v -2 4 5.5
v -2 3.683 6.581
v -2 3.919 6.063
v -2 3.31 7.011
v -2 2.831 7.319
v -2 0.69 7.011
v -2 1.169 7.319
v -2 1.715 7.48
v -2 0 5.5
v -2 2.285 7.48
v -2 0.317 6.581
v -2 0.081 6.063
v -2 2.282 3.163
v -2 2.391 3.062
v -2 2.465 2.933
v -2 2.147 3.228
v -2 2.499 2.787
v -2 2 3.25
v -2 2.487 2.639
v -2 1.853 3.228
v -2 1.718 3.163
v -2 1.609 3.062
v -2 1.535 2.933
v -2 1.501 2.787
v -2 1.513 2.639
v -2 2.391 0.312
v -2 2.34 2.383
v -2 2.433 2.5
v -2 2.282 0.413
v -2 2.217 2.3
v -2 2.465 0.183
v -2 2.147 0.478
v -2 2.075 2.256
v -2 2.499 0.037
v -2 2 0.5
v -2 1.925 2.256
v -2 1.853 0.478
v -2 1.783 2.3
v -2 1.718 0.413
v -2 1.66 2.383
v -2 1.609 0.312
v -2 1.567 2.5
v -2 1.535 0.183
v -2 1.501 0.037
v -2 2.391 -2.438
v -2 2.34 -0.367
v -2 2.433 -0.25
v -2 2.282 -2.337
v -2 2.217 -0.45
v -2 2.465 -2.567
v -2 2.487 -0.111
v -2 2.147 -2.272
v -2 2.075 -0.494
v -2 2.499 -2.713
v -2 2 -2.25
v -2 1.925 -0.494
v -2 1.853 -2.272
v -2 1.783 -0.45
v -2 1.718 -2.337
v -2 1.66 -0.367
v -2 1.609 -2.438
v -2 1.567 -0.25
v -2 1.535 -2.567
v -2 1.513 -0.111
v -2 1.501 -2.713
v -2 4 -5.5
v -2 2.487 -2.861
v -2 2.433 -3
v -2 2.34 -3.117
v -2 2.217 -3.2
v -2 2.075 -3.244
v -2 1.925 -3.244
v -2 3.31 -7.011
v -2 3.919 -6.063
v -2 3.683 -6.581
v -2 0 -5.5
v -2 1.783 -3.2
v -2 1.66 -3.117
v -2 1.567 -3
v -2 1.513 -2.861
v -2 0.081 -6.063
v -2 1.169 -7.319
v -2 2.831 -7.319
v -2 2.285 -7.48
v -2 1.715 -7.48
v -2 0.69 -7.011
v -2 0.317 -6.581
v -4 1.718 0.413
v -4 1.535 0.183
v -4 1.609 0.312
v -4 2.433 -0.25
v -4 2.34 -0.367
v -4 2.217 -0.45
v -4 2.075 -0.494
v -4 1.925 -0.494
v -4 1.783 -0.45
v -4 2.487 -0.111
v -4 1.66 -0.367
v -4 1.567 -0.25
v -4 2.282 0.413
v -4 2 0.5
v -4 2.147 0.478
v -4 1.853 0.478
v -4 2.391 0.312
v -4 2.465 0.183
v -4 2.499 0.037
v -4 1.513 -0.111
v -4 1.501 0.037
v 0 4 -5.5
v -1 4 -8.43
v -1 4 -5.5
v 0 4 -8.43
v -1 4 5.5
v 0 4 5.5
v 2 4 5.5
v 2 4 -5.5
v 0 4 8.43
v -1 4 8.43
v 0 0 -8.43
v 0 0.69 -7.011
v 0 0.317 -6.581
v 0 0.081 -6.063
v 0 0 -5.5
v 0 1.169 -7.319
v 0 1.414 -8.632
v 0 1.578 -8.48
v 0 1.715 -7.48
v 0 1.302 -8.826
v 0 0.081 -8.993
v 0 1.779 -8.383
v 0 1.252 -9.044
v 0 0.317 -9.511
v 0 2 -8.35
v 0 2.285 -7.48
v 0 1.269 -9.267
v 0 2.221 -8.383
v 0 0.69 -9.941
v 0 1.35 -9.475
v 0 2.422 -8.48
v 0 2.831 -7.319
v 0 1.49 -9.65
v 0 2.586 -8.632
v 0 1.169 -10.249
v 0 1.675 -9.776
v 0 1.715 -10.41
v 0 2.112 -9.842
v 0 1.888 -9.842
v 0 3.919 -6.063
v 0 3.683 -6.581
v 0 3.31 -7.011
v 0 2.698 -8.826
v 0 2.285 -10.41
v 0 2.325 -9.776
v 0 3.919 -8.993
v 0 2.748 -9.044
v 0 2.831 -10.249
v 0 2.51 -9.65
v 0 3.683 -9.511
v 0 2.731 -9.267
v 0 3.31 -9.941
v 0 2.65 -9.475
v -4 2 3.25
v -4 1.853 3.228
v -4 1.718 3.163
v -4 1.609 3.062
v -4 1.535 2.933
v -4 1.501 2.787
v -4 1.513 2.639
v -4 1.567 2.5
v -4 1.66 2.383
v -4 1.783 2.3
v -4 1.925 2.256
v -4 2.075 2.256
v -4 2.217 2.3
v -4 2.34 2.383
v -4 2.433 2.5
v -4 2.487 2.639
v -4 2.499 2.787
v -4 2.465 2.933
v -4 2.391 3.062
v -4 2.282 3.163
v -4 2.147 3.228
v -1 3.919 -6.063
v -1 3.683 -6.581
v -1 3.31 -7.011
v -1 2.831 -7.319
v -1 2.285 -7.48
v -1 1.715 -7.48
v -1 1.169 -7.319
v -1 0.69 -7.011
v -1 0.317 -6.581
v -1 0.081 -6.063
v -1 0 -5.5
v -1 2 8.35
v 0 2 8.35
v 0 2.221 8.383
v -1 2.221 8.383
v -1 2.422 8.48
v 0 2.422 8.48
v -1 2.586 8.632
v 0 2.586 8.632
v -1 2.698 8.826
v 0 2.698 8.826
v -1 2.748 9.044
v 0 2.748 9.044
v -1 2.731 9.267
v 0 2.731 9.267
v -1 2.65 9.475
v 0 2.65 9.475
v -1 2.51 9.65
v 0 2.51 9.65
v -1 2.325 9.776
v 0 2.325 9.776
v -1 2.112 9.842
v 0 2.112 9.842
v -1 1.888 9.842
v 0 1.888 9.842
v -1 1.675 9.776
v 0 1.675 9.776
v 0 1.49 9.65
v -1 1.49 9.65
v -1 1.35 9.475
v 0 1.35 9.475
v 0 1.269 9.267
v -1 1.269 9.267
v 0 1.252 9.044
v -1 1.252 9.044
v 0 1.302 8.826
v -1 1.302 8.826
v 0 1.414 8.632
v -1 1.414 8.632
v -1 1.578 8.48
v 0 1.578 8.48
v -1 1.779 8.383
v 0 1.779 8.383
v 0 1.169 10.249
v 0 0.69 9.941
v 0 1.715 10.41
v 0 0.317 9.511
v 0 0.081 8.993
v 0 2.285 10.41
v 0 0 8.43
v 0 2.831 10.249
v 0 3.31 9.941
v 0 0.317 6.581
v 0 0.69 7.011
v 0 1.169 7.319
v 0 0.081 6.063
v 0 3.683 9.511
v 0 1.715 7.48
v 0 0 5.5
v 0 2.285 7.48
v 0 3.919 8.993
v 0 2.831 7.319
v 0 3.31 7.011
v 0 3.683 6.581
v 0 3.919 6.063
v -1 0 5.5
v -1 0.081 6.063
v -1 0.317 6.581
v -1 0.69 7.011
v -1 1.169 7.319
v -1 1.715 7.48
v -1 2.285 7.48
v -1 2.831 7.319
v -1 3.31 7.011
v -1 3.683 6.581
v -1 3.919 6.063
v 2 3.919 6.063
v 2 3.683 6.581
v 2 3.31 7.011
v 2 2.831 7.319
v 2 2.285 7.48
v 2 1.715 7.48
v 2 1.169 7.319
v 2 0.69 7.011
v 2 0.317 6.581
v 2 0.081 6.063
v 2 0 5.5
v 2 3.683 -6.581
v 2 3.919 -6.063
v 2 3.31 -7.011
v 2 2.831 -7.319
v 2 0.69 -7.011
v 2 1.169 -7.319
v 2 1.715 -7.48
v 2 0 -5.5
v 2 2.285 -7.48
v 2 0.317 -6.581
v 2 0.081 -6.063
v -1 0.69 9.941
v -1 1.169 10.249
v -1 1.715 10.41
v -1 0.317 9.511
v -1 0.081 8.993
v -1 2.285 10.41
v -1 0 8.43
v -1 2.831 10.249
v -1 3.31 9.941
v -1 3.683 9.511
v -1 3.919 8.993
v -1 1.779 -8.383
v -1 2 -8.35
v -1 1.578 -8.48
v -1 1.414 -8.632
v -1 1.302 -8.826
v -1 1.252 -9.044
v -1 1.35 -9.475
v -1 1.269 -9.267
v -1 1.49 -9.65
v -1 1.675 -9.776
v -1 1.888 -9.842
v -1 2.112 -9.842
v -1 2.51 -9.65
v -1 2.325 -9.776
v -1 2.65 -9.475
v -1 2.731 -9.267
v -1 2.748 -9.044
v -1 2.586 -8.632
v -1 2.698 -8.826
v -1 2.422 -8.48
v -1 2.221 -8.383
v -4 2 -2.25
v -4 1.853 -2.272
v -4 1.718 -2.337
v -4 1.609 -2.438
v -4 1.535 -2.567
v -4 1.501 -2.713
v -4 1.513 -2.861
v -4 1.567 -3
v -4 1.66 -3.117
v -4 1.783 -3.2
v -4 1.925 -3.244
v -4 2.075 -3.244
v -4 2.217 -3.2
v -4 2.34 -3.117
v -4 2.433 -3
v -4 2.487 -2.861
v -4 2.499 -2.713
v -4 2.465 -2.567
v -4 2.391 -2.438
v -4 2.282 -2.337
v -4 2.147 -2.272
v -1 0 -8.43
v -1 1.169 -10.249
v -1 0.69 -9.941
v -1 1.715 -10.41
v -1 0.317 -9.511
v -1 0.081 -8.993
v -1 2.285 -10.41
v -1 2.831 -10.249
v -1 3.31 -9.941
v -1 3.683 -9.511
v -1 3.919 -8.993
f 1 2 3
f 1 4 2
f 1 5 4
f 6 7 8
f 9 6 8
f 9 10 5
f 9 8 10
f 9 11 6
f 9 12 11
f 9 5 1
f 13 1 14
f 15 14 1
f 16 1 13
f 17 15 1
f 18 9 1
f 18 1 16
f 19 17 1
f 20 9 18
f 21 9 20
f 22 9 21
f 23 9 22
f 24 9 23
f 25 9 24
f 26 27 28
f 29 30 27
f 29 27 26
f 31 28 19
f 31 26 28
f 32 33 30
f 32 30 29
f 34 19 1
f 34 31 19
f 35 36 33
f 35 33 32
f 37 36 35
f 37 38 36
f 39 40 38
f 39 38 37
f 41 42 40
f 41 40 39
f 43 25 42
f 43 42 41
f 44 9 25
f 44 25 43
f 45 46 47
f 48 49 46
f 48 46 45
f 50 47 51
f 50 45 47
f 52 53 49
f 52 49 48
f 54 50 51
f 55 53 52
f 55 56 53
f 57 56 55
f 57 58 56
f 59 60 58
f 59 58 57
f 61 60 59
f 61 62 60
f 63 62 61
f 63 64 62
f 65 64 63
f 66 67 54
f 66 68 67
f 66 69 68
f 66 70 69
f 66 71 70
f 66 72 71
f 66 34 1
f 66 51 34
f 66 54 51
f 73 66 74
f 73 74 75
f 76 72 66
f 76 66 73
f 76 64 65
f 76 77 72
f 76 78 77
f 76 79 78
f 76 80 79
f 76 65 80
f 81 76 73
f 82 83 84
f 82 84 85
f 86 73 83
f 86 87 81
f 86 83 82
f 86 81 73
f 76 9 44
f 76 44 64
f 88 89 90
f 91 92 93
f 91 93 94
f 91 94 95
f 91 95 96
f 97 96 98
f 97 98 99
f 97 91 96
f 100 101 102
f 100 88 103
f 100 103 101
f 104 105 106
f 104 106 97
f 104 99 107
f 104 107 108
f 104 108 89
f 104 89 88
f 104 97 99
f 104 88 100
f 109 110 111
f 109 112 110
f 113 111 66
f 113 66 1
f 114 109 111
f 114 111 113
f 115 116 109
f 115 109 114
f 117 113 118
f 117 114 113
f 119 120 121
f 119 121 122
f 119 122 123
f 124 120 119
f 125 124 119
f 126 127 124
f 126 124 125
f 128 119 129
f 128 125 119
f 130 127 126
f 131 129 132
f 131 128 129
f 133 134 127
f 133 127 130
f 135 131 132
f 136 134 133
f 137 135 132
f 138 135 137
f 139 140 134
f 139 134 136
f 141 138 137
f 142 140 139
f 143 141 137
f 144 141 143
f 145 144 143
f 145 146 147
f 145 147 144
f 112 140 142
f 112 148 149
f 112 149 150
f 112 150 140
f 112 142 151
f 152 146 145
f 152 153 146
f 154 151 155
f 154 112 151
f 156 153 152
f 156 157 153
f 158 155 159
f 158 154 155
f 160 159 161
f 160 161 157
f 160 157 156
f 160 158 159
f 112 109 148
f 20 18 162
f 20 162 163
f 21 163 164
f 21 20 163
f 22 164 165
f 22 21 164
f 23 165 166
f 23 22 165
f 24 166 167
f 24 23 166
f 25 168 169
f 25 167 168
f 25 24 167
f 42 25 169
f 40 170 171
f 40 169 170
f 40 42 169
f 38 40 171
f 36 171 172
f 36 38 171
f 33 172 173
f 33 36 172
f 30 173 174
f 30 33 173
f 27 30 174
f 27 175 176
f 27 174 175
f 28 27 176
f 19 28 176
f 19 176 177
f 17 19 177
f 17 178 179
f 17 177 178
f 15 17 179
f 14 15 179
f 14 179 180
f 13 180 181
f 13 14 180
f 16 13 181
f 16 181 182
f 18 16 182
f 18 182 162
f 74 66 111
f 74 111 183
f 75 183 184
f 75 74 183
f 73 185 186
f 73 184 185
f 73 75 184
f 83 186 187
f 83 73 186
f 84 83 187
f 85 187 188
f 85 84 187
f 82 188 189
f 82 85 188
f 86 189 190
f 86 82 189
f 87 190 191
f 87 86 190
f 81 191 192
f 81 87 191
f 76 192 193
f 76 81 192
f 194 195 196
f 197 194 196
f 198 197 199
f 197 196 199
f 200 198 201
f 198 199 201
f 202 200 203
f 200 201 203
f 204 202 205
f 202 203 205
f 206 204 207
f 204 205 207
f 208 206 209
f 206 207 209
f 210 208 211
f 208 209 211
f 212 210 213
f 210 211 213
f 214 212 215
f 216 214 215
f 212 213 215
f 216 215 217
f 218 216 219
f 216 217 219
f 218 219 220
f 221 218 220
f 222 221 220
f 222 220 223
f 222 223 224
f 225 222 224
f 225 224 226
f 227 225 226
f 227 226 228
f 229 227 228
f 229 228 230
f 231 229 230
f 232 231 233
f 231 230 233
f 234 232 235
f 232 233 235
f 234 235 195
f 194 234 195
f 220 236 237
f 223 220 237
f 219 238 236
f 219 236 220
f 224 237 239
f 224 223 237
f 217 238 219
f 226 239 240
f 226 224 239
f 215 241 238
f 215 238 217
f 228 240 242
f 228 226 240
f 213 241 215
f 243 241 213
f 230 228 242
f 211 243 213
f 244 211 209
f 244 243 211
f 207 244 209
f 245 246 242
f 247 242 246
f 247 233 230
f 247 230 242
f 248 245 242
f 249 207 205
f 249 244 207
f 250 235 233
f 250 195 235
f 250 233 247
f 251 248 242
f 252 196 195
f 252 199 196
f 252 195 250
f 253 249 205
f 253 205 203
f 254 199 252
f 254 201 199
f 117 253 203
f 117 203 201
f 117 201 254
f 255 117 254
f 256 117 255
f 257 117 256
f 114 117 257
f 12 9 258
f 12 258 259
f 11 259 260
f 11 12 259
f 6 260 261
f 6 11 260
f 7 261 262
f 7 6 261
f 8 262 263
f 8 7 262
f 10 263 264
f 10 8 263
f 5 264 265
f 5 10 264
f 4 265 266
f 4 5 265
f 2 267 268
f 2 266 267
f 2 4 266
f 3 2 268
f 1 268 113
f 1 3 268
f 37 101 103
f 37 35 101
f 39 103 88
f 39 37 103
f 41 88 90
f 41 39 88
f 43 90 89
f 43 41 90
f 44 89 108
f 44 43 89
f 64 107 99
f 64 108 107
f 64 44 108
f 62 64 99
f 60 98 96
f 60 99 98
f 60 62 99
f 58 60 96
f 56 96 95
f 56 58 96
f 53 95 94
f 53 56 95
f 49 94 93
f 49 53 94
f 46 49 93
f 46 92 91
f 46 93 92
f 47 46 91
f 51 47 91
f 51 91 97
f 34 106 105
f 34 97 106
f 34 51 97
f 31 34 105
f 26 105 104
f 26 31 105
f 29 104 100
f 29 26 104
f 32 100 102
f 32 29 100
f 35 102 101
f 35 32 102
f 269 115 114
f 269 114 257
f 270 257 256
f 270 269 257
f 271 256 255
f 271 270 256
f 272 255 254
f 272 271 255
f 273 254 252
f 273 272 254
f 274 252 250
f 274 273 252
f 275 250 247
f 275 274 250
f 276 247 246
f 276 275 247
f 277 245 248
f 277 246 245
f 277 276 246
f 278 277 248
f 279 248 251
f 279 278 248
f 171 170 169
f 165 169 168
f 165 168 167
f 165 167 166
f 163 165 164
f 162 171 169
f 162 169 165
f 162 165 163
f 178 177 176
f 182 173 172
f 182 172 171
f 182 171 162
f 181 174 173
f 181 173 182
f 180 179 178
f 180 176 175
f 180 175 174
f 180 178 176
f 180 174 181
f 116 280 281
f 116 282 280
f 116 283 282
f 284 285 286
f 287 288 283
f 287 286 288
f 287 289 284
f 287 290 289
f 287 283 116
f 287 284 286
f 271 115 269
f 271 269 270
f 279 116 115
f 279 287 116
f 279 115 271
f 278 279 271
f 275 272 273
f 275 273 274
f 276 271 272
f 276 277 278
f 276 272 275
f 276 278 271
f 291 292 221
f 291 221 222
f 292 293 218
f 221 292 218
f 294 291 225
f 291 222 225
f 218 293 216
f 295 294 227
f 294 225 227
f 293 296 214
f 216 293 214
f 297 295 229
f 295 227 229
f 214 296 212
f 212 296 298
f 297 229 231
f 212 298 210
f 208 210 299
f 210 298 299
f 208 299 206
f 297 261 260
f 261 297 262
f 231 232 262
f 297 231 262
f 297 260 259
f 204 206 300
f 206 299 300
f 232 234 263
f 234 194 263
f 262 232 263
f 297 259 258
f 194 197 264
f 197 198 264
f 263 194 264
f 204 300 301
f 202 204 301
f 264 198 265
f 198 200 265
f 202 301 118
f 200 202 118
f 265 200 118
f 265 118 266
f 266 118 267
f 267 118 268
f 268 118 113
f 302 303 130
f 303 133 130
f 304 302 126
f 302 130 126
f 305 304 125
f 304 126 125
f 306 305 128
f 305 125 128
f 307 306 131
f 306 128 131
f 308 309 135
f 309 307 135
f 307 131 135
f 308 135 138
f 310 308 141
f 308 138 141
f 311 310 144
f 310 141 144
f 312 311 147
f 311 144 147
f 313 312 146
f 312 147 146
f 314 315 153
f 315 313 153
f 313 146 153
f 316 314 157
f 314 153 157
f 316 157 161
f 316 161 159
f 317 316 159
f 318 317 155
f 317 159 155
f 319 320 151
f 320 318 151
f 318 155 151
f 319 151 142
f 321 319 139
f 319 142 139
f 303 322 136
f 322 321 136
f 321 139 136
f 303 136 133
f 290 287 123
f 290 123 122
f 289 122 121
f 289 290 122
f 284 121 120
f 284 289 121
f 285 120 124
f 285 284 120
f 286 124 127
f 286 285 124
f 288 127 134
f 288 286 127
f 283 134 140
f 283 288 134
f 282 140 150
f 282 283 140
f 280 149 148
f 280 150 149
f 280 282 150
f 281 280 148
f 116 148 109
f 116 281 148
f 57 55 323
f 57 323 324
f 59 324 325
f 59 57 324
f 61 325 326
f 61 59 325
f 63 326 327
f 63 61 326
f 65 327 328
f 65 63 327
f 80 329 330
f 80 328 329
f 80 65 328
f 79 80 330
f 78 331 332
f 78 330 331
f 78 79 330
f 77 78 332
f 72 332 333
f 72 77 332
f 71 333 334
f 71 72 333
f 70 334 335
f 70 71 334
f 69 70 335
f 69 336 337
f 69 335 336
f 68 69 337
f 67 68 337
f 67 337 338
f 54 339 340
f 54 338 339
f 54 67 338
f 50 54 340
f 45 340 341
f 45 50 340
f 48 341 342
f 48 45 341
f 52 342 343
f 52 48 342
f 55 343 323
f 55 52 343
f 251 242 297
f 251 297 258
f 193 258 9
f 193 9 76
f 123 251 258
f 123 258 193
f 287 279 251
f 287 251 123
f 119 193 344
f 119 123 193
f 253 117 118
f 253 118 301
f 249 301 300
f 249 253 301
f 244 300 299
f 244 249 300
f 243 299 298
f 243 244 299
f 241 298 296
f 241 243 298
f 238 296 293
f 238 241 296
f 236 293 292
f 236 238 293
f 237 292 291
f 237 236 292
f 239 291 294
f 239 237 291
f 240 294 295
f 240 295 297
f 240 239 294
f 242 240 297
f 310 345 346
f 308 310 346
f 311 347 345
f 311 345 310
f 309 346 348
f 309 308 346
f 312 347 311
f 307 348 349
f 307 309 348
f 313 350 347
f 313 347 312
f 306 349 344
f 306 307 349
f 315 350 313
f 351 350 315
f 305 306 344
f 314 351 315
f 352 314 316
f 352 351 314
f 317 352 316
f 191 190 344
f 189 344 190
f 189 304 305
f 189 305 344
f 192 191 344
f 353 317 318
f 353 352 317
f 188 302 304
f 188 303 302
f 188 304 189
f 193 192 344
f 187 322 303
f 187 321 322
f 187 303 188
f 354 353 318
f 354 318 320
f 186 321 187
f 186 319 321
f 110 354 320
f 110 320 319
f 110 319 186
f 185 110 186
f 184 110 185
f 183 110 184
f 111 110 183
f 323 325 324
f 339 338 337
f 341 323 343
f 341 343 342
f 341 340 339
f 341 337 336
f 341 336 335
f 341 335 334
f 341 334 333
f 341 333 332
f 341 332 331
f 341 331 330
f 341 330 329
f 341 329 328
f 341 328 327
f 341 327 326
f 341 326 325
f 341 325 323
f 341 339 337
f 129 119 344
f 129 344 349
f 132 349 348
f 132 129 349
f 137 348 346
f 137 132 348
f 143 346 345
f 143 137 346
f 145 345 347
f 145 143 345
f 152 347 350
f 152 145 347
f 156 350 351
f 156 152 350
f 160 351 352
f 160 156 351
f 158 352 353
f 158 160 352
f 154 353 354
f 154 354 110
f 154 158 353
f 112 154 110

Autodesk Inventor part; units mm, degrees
ref_plane "YZ Plane" through (0, 0, 0) normal (1, 0, 0) x (0, 1, 0)
ref_plane "XZ Plane" through (0, 0, 0) normal (0, 1, 0) x (-1, 0, 0)
ref_plane "XY Plane" through (0, 0, 0) normal (0, 0, 1) x (1, 0, 0)
sketch "Sketch1" plane through (0, 0, 0) normal (0, 1, 0) x (-1, 0, 0)
  line L0 (-2, 7.5) -> (2, 7.5)
  line L1 (2, 7.5) -> (2, -7.5)
  line L2 (2, -7.5) -> (-2, -7.5)
  line L3 (-2, -7.5) -> (-2, 7.5)
  line L4 (-2, 7.5) -> (2, -7.5) construction
  line L5 (2, 7.5) -> (-2, -7.5) construction
  point P0 (0, 0)
  dimension "d0" = 4
  dimension "d1" = 15
extrude "Extrusion1" add sketch "Sketch1" along normal blind 4
sketch "Sketch2" plane through (2, 0, 7.5) normal (1, 0, 0) x (0, 0, -1)
  line L0 (0, 0) -> (0, 4) projected
  line L1 (0, 2) -> (15, 2) construction
  line L2 (15, 0) -> (15, 4) projected
  line L3 (2, 0) -> (13, 0)
  line L4 (13, 4) -> (2, 4)
  arc A0 (2, 4) -> (2, 0) centre (2, 2) ccw
  arc A1 (13, 0) -> (13, 4) centre (13, 2) ccw
  line L5 (0, 4) -> (15, 4) projected
  line L6 (0, 0) -> (15, 0) projected
  point P0 (7.5, 0)
  point P1 (7.5, 2)
  point P2 (15, 2)
extrude "Extrusion2" cut sketch "Sketch2" against normal blind 2 contours L0 A0 L6 | L0 L5 A0 | A1 L2 L6 | L5 L2 A1
sketch "Sketch3" plane through (-2, 0, -7.5) normal (-1, 0, 0) x (0, 0, 1)
  arc A0 (2, 4) -> (0, 2) centre (2, 2) ccw projected
  line L0 (0, 0) -> (0, 4) projected
  line L1 (0, 4) -> (15, 4) projected
  arc A1 (0, 2) -> (2, 0) centre (2, 2) ccw projected
  arc A2 (2, 4) -> (2, 0) centre (2, 2) ccw projected
  line L2 (13, 4) -> (2, 4) projected
  arc A3 (13, 0) -> (13, 4) centre (13, 2) ccw projected
  line L3 (13, 0) -> (2, 0) projected
  line L4 (15, 0) -> (15, 4) projected
  line L5 (0, 0) -> (15, 0) projected
  point P0 (7.5, 0)
  point P1 (15, 2)
extrude "Extrusion3" cut sketch "Sketch3" against normal blind 1 contours A0 L0 L1 | A1 L5 L0 | L1 L4 A3 | L4 L5 A3
sketch "Sketch4" plane through (-2, 0, -5.5) normal (-1, 0, 0) x (0, 0, 1)
  arc A0 (0, 4) -> (-2, 2) centre (0, 2) ccw projected
  circle A1 centre (0, 2) radius 1.5
  arc A2 (13, 2) -> (11, 4) centre (11, 2) ccw projected
  circle A3 centre (11, 2) radius 1.5
  point P0 (5.5, 0)
  dimension "d8" = 3
  dimension "d9" = 3
mark "Mark1"
sketch "Sketch5" plane through (-2, 0, -5.5) normal (-1, 0, 0) x (0, 0, 1)
  circle A0 centre (2.75, 2) radius 1
  circle A1 centre (0, 2) radius 1.5 projected
  circle A2 centre (11, 2) radius 1.5 projected
  line L0 (0, 4) -> (11, 4) projected
  circle A3 centre (5.5, 2) radius 1
  circle A4 centre (8.25, 2) radius 1
  point P0 (5.5, 0)
  dimension "d10" = 2
  dimension "d11" = 2.75
  dimension "d12" = 11
  dimension "d15" = 2.75
mark "Mark2"
sketch "Sketch6" plane through (-2, 2, -2.75) normal (-1, 0, 0) x (0, 0, 1)
  circle A0 centre (0, 0) radius 1 projected
  circle A1 centre (0, 0) radius 0.5
  circle A2 centre (2.75, 0) radius 1 projected
  circle A3 centre (2.75, 0) radius 0.5
  circle A4 centre (5.5, 0) radius 1 projected
  circle A5 centre (5.5, 0) radius 0.5
  point P0 (2.75, -2)
  dimension "d20" = 1
  dimension "d21" = 1
  dimension "d38" = 1
extrude "Extrusion4" add sketch "Sketch6" along normal blind 2 contours A1 | A3 | A5
sketch "Sketch7" plane through (2, 0, 5.5) normal (1, 0, 0) x (0, 0, -1)
  circle A0 centre (0, 2) radius 1.5 projected
  circle A1 centre (11, 2) radius 1.5 projected
  point P0 (5.5, 0)
mark "Mark3"
sketch "Sketch8" plane through (2, 0, 5.5) normal (1, 0, 0) x (0, 0, -1)
  circle A0 centre (8.25, 2) radius 1 projected
  circle A1 centre (5.5, 2) radius 1 projected
  circle A2 centre (5.5, 2) radius 0.75
  circle A3 centre (8.25, 2) radius 0.75
  circle A4 centre (2.75, 2) radius 1 projected
  circle A5 centre (2.75, 2) radius 0.75
  point P0 (5.5, 0)
  dimension "d24" = 1.5
  dimension "d25" = 1.5
  dimension "d39" = 1.5
mark "Mark4"
sketch "Sketch11" plane through (0, 0, 7.5) normal (1, 0, 0) x (0, 0, -1)
  line L0 (-2.93, 2) -> (17.93, 2) construction
  line L1 (-0.93, 0) -> (15.93, 0)
  line L2 (15.93, 4) -> (-0.93, 4)
  arc A0 (-0.93, 4) -> (-0.93, 0) centre (-0.93, 2) ccw
  arc A1 (15.93, 0) -> (15.93, 4) centre (15.93, 2) ccw
  line L3 (2, 0) -> (13, 0) projected
  point P0 (7.5, 0)
  point P1 (7.5, 2)
  point P2 (7.5, 4)
  point P3 (7.5, 0)
  dimension "d31" = 20.86
extrude "Extrusion7" add sketch "Sketch11" against normal blind 1
sketch "Sketch12" plane through (0, 0, 7.5) normal (1, 0, 0) x (0, 0, -1)
  arc A0 (-0.93, 4) -> (-0.93, 0) centre (-0.93, 2) ccw projected
  circle A1 centre (-1.6, 2) radius 0.75
  circle A2 centre (2, 2) radius 1.5 projected
  point P0 (7.5, 0)
  dimension "d34" = 1.5
  dimension "d35" = 3.6
extrude "Extrusion8" cut sketch "Sketch12" against normal blind 1 contours A1
mirror "Mirror1" about plane through (0, 0, 0) normal (0, 0, 1) of "Extrusion8"
equation "\"d9\" = d8"
equation "\"d11\" = 0.25 * d12"
equation "\"d15\" = d11"
equation "\"d21\" = d20"
equation "\"d38\" = d21"
equation "\"d25\" = d24"
equation "\"d39\" = d24"
properties part number "3_pin_ear_female"
